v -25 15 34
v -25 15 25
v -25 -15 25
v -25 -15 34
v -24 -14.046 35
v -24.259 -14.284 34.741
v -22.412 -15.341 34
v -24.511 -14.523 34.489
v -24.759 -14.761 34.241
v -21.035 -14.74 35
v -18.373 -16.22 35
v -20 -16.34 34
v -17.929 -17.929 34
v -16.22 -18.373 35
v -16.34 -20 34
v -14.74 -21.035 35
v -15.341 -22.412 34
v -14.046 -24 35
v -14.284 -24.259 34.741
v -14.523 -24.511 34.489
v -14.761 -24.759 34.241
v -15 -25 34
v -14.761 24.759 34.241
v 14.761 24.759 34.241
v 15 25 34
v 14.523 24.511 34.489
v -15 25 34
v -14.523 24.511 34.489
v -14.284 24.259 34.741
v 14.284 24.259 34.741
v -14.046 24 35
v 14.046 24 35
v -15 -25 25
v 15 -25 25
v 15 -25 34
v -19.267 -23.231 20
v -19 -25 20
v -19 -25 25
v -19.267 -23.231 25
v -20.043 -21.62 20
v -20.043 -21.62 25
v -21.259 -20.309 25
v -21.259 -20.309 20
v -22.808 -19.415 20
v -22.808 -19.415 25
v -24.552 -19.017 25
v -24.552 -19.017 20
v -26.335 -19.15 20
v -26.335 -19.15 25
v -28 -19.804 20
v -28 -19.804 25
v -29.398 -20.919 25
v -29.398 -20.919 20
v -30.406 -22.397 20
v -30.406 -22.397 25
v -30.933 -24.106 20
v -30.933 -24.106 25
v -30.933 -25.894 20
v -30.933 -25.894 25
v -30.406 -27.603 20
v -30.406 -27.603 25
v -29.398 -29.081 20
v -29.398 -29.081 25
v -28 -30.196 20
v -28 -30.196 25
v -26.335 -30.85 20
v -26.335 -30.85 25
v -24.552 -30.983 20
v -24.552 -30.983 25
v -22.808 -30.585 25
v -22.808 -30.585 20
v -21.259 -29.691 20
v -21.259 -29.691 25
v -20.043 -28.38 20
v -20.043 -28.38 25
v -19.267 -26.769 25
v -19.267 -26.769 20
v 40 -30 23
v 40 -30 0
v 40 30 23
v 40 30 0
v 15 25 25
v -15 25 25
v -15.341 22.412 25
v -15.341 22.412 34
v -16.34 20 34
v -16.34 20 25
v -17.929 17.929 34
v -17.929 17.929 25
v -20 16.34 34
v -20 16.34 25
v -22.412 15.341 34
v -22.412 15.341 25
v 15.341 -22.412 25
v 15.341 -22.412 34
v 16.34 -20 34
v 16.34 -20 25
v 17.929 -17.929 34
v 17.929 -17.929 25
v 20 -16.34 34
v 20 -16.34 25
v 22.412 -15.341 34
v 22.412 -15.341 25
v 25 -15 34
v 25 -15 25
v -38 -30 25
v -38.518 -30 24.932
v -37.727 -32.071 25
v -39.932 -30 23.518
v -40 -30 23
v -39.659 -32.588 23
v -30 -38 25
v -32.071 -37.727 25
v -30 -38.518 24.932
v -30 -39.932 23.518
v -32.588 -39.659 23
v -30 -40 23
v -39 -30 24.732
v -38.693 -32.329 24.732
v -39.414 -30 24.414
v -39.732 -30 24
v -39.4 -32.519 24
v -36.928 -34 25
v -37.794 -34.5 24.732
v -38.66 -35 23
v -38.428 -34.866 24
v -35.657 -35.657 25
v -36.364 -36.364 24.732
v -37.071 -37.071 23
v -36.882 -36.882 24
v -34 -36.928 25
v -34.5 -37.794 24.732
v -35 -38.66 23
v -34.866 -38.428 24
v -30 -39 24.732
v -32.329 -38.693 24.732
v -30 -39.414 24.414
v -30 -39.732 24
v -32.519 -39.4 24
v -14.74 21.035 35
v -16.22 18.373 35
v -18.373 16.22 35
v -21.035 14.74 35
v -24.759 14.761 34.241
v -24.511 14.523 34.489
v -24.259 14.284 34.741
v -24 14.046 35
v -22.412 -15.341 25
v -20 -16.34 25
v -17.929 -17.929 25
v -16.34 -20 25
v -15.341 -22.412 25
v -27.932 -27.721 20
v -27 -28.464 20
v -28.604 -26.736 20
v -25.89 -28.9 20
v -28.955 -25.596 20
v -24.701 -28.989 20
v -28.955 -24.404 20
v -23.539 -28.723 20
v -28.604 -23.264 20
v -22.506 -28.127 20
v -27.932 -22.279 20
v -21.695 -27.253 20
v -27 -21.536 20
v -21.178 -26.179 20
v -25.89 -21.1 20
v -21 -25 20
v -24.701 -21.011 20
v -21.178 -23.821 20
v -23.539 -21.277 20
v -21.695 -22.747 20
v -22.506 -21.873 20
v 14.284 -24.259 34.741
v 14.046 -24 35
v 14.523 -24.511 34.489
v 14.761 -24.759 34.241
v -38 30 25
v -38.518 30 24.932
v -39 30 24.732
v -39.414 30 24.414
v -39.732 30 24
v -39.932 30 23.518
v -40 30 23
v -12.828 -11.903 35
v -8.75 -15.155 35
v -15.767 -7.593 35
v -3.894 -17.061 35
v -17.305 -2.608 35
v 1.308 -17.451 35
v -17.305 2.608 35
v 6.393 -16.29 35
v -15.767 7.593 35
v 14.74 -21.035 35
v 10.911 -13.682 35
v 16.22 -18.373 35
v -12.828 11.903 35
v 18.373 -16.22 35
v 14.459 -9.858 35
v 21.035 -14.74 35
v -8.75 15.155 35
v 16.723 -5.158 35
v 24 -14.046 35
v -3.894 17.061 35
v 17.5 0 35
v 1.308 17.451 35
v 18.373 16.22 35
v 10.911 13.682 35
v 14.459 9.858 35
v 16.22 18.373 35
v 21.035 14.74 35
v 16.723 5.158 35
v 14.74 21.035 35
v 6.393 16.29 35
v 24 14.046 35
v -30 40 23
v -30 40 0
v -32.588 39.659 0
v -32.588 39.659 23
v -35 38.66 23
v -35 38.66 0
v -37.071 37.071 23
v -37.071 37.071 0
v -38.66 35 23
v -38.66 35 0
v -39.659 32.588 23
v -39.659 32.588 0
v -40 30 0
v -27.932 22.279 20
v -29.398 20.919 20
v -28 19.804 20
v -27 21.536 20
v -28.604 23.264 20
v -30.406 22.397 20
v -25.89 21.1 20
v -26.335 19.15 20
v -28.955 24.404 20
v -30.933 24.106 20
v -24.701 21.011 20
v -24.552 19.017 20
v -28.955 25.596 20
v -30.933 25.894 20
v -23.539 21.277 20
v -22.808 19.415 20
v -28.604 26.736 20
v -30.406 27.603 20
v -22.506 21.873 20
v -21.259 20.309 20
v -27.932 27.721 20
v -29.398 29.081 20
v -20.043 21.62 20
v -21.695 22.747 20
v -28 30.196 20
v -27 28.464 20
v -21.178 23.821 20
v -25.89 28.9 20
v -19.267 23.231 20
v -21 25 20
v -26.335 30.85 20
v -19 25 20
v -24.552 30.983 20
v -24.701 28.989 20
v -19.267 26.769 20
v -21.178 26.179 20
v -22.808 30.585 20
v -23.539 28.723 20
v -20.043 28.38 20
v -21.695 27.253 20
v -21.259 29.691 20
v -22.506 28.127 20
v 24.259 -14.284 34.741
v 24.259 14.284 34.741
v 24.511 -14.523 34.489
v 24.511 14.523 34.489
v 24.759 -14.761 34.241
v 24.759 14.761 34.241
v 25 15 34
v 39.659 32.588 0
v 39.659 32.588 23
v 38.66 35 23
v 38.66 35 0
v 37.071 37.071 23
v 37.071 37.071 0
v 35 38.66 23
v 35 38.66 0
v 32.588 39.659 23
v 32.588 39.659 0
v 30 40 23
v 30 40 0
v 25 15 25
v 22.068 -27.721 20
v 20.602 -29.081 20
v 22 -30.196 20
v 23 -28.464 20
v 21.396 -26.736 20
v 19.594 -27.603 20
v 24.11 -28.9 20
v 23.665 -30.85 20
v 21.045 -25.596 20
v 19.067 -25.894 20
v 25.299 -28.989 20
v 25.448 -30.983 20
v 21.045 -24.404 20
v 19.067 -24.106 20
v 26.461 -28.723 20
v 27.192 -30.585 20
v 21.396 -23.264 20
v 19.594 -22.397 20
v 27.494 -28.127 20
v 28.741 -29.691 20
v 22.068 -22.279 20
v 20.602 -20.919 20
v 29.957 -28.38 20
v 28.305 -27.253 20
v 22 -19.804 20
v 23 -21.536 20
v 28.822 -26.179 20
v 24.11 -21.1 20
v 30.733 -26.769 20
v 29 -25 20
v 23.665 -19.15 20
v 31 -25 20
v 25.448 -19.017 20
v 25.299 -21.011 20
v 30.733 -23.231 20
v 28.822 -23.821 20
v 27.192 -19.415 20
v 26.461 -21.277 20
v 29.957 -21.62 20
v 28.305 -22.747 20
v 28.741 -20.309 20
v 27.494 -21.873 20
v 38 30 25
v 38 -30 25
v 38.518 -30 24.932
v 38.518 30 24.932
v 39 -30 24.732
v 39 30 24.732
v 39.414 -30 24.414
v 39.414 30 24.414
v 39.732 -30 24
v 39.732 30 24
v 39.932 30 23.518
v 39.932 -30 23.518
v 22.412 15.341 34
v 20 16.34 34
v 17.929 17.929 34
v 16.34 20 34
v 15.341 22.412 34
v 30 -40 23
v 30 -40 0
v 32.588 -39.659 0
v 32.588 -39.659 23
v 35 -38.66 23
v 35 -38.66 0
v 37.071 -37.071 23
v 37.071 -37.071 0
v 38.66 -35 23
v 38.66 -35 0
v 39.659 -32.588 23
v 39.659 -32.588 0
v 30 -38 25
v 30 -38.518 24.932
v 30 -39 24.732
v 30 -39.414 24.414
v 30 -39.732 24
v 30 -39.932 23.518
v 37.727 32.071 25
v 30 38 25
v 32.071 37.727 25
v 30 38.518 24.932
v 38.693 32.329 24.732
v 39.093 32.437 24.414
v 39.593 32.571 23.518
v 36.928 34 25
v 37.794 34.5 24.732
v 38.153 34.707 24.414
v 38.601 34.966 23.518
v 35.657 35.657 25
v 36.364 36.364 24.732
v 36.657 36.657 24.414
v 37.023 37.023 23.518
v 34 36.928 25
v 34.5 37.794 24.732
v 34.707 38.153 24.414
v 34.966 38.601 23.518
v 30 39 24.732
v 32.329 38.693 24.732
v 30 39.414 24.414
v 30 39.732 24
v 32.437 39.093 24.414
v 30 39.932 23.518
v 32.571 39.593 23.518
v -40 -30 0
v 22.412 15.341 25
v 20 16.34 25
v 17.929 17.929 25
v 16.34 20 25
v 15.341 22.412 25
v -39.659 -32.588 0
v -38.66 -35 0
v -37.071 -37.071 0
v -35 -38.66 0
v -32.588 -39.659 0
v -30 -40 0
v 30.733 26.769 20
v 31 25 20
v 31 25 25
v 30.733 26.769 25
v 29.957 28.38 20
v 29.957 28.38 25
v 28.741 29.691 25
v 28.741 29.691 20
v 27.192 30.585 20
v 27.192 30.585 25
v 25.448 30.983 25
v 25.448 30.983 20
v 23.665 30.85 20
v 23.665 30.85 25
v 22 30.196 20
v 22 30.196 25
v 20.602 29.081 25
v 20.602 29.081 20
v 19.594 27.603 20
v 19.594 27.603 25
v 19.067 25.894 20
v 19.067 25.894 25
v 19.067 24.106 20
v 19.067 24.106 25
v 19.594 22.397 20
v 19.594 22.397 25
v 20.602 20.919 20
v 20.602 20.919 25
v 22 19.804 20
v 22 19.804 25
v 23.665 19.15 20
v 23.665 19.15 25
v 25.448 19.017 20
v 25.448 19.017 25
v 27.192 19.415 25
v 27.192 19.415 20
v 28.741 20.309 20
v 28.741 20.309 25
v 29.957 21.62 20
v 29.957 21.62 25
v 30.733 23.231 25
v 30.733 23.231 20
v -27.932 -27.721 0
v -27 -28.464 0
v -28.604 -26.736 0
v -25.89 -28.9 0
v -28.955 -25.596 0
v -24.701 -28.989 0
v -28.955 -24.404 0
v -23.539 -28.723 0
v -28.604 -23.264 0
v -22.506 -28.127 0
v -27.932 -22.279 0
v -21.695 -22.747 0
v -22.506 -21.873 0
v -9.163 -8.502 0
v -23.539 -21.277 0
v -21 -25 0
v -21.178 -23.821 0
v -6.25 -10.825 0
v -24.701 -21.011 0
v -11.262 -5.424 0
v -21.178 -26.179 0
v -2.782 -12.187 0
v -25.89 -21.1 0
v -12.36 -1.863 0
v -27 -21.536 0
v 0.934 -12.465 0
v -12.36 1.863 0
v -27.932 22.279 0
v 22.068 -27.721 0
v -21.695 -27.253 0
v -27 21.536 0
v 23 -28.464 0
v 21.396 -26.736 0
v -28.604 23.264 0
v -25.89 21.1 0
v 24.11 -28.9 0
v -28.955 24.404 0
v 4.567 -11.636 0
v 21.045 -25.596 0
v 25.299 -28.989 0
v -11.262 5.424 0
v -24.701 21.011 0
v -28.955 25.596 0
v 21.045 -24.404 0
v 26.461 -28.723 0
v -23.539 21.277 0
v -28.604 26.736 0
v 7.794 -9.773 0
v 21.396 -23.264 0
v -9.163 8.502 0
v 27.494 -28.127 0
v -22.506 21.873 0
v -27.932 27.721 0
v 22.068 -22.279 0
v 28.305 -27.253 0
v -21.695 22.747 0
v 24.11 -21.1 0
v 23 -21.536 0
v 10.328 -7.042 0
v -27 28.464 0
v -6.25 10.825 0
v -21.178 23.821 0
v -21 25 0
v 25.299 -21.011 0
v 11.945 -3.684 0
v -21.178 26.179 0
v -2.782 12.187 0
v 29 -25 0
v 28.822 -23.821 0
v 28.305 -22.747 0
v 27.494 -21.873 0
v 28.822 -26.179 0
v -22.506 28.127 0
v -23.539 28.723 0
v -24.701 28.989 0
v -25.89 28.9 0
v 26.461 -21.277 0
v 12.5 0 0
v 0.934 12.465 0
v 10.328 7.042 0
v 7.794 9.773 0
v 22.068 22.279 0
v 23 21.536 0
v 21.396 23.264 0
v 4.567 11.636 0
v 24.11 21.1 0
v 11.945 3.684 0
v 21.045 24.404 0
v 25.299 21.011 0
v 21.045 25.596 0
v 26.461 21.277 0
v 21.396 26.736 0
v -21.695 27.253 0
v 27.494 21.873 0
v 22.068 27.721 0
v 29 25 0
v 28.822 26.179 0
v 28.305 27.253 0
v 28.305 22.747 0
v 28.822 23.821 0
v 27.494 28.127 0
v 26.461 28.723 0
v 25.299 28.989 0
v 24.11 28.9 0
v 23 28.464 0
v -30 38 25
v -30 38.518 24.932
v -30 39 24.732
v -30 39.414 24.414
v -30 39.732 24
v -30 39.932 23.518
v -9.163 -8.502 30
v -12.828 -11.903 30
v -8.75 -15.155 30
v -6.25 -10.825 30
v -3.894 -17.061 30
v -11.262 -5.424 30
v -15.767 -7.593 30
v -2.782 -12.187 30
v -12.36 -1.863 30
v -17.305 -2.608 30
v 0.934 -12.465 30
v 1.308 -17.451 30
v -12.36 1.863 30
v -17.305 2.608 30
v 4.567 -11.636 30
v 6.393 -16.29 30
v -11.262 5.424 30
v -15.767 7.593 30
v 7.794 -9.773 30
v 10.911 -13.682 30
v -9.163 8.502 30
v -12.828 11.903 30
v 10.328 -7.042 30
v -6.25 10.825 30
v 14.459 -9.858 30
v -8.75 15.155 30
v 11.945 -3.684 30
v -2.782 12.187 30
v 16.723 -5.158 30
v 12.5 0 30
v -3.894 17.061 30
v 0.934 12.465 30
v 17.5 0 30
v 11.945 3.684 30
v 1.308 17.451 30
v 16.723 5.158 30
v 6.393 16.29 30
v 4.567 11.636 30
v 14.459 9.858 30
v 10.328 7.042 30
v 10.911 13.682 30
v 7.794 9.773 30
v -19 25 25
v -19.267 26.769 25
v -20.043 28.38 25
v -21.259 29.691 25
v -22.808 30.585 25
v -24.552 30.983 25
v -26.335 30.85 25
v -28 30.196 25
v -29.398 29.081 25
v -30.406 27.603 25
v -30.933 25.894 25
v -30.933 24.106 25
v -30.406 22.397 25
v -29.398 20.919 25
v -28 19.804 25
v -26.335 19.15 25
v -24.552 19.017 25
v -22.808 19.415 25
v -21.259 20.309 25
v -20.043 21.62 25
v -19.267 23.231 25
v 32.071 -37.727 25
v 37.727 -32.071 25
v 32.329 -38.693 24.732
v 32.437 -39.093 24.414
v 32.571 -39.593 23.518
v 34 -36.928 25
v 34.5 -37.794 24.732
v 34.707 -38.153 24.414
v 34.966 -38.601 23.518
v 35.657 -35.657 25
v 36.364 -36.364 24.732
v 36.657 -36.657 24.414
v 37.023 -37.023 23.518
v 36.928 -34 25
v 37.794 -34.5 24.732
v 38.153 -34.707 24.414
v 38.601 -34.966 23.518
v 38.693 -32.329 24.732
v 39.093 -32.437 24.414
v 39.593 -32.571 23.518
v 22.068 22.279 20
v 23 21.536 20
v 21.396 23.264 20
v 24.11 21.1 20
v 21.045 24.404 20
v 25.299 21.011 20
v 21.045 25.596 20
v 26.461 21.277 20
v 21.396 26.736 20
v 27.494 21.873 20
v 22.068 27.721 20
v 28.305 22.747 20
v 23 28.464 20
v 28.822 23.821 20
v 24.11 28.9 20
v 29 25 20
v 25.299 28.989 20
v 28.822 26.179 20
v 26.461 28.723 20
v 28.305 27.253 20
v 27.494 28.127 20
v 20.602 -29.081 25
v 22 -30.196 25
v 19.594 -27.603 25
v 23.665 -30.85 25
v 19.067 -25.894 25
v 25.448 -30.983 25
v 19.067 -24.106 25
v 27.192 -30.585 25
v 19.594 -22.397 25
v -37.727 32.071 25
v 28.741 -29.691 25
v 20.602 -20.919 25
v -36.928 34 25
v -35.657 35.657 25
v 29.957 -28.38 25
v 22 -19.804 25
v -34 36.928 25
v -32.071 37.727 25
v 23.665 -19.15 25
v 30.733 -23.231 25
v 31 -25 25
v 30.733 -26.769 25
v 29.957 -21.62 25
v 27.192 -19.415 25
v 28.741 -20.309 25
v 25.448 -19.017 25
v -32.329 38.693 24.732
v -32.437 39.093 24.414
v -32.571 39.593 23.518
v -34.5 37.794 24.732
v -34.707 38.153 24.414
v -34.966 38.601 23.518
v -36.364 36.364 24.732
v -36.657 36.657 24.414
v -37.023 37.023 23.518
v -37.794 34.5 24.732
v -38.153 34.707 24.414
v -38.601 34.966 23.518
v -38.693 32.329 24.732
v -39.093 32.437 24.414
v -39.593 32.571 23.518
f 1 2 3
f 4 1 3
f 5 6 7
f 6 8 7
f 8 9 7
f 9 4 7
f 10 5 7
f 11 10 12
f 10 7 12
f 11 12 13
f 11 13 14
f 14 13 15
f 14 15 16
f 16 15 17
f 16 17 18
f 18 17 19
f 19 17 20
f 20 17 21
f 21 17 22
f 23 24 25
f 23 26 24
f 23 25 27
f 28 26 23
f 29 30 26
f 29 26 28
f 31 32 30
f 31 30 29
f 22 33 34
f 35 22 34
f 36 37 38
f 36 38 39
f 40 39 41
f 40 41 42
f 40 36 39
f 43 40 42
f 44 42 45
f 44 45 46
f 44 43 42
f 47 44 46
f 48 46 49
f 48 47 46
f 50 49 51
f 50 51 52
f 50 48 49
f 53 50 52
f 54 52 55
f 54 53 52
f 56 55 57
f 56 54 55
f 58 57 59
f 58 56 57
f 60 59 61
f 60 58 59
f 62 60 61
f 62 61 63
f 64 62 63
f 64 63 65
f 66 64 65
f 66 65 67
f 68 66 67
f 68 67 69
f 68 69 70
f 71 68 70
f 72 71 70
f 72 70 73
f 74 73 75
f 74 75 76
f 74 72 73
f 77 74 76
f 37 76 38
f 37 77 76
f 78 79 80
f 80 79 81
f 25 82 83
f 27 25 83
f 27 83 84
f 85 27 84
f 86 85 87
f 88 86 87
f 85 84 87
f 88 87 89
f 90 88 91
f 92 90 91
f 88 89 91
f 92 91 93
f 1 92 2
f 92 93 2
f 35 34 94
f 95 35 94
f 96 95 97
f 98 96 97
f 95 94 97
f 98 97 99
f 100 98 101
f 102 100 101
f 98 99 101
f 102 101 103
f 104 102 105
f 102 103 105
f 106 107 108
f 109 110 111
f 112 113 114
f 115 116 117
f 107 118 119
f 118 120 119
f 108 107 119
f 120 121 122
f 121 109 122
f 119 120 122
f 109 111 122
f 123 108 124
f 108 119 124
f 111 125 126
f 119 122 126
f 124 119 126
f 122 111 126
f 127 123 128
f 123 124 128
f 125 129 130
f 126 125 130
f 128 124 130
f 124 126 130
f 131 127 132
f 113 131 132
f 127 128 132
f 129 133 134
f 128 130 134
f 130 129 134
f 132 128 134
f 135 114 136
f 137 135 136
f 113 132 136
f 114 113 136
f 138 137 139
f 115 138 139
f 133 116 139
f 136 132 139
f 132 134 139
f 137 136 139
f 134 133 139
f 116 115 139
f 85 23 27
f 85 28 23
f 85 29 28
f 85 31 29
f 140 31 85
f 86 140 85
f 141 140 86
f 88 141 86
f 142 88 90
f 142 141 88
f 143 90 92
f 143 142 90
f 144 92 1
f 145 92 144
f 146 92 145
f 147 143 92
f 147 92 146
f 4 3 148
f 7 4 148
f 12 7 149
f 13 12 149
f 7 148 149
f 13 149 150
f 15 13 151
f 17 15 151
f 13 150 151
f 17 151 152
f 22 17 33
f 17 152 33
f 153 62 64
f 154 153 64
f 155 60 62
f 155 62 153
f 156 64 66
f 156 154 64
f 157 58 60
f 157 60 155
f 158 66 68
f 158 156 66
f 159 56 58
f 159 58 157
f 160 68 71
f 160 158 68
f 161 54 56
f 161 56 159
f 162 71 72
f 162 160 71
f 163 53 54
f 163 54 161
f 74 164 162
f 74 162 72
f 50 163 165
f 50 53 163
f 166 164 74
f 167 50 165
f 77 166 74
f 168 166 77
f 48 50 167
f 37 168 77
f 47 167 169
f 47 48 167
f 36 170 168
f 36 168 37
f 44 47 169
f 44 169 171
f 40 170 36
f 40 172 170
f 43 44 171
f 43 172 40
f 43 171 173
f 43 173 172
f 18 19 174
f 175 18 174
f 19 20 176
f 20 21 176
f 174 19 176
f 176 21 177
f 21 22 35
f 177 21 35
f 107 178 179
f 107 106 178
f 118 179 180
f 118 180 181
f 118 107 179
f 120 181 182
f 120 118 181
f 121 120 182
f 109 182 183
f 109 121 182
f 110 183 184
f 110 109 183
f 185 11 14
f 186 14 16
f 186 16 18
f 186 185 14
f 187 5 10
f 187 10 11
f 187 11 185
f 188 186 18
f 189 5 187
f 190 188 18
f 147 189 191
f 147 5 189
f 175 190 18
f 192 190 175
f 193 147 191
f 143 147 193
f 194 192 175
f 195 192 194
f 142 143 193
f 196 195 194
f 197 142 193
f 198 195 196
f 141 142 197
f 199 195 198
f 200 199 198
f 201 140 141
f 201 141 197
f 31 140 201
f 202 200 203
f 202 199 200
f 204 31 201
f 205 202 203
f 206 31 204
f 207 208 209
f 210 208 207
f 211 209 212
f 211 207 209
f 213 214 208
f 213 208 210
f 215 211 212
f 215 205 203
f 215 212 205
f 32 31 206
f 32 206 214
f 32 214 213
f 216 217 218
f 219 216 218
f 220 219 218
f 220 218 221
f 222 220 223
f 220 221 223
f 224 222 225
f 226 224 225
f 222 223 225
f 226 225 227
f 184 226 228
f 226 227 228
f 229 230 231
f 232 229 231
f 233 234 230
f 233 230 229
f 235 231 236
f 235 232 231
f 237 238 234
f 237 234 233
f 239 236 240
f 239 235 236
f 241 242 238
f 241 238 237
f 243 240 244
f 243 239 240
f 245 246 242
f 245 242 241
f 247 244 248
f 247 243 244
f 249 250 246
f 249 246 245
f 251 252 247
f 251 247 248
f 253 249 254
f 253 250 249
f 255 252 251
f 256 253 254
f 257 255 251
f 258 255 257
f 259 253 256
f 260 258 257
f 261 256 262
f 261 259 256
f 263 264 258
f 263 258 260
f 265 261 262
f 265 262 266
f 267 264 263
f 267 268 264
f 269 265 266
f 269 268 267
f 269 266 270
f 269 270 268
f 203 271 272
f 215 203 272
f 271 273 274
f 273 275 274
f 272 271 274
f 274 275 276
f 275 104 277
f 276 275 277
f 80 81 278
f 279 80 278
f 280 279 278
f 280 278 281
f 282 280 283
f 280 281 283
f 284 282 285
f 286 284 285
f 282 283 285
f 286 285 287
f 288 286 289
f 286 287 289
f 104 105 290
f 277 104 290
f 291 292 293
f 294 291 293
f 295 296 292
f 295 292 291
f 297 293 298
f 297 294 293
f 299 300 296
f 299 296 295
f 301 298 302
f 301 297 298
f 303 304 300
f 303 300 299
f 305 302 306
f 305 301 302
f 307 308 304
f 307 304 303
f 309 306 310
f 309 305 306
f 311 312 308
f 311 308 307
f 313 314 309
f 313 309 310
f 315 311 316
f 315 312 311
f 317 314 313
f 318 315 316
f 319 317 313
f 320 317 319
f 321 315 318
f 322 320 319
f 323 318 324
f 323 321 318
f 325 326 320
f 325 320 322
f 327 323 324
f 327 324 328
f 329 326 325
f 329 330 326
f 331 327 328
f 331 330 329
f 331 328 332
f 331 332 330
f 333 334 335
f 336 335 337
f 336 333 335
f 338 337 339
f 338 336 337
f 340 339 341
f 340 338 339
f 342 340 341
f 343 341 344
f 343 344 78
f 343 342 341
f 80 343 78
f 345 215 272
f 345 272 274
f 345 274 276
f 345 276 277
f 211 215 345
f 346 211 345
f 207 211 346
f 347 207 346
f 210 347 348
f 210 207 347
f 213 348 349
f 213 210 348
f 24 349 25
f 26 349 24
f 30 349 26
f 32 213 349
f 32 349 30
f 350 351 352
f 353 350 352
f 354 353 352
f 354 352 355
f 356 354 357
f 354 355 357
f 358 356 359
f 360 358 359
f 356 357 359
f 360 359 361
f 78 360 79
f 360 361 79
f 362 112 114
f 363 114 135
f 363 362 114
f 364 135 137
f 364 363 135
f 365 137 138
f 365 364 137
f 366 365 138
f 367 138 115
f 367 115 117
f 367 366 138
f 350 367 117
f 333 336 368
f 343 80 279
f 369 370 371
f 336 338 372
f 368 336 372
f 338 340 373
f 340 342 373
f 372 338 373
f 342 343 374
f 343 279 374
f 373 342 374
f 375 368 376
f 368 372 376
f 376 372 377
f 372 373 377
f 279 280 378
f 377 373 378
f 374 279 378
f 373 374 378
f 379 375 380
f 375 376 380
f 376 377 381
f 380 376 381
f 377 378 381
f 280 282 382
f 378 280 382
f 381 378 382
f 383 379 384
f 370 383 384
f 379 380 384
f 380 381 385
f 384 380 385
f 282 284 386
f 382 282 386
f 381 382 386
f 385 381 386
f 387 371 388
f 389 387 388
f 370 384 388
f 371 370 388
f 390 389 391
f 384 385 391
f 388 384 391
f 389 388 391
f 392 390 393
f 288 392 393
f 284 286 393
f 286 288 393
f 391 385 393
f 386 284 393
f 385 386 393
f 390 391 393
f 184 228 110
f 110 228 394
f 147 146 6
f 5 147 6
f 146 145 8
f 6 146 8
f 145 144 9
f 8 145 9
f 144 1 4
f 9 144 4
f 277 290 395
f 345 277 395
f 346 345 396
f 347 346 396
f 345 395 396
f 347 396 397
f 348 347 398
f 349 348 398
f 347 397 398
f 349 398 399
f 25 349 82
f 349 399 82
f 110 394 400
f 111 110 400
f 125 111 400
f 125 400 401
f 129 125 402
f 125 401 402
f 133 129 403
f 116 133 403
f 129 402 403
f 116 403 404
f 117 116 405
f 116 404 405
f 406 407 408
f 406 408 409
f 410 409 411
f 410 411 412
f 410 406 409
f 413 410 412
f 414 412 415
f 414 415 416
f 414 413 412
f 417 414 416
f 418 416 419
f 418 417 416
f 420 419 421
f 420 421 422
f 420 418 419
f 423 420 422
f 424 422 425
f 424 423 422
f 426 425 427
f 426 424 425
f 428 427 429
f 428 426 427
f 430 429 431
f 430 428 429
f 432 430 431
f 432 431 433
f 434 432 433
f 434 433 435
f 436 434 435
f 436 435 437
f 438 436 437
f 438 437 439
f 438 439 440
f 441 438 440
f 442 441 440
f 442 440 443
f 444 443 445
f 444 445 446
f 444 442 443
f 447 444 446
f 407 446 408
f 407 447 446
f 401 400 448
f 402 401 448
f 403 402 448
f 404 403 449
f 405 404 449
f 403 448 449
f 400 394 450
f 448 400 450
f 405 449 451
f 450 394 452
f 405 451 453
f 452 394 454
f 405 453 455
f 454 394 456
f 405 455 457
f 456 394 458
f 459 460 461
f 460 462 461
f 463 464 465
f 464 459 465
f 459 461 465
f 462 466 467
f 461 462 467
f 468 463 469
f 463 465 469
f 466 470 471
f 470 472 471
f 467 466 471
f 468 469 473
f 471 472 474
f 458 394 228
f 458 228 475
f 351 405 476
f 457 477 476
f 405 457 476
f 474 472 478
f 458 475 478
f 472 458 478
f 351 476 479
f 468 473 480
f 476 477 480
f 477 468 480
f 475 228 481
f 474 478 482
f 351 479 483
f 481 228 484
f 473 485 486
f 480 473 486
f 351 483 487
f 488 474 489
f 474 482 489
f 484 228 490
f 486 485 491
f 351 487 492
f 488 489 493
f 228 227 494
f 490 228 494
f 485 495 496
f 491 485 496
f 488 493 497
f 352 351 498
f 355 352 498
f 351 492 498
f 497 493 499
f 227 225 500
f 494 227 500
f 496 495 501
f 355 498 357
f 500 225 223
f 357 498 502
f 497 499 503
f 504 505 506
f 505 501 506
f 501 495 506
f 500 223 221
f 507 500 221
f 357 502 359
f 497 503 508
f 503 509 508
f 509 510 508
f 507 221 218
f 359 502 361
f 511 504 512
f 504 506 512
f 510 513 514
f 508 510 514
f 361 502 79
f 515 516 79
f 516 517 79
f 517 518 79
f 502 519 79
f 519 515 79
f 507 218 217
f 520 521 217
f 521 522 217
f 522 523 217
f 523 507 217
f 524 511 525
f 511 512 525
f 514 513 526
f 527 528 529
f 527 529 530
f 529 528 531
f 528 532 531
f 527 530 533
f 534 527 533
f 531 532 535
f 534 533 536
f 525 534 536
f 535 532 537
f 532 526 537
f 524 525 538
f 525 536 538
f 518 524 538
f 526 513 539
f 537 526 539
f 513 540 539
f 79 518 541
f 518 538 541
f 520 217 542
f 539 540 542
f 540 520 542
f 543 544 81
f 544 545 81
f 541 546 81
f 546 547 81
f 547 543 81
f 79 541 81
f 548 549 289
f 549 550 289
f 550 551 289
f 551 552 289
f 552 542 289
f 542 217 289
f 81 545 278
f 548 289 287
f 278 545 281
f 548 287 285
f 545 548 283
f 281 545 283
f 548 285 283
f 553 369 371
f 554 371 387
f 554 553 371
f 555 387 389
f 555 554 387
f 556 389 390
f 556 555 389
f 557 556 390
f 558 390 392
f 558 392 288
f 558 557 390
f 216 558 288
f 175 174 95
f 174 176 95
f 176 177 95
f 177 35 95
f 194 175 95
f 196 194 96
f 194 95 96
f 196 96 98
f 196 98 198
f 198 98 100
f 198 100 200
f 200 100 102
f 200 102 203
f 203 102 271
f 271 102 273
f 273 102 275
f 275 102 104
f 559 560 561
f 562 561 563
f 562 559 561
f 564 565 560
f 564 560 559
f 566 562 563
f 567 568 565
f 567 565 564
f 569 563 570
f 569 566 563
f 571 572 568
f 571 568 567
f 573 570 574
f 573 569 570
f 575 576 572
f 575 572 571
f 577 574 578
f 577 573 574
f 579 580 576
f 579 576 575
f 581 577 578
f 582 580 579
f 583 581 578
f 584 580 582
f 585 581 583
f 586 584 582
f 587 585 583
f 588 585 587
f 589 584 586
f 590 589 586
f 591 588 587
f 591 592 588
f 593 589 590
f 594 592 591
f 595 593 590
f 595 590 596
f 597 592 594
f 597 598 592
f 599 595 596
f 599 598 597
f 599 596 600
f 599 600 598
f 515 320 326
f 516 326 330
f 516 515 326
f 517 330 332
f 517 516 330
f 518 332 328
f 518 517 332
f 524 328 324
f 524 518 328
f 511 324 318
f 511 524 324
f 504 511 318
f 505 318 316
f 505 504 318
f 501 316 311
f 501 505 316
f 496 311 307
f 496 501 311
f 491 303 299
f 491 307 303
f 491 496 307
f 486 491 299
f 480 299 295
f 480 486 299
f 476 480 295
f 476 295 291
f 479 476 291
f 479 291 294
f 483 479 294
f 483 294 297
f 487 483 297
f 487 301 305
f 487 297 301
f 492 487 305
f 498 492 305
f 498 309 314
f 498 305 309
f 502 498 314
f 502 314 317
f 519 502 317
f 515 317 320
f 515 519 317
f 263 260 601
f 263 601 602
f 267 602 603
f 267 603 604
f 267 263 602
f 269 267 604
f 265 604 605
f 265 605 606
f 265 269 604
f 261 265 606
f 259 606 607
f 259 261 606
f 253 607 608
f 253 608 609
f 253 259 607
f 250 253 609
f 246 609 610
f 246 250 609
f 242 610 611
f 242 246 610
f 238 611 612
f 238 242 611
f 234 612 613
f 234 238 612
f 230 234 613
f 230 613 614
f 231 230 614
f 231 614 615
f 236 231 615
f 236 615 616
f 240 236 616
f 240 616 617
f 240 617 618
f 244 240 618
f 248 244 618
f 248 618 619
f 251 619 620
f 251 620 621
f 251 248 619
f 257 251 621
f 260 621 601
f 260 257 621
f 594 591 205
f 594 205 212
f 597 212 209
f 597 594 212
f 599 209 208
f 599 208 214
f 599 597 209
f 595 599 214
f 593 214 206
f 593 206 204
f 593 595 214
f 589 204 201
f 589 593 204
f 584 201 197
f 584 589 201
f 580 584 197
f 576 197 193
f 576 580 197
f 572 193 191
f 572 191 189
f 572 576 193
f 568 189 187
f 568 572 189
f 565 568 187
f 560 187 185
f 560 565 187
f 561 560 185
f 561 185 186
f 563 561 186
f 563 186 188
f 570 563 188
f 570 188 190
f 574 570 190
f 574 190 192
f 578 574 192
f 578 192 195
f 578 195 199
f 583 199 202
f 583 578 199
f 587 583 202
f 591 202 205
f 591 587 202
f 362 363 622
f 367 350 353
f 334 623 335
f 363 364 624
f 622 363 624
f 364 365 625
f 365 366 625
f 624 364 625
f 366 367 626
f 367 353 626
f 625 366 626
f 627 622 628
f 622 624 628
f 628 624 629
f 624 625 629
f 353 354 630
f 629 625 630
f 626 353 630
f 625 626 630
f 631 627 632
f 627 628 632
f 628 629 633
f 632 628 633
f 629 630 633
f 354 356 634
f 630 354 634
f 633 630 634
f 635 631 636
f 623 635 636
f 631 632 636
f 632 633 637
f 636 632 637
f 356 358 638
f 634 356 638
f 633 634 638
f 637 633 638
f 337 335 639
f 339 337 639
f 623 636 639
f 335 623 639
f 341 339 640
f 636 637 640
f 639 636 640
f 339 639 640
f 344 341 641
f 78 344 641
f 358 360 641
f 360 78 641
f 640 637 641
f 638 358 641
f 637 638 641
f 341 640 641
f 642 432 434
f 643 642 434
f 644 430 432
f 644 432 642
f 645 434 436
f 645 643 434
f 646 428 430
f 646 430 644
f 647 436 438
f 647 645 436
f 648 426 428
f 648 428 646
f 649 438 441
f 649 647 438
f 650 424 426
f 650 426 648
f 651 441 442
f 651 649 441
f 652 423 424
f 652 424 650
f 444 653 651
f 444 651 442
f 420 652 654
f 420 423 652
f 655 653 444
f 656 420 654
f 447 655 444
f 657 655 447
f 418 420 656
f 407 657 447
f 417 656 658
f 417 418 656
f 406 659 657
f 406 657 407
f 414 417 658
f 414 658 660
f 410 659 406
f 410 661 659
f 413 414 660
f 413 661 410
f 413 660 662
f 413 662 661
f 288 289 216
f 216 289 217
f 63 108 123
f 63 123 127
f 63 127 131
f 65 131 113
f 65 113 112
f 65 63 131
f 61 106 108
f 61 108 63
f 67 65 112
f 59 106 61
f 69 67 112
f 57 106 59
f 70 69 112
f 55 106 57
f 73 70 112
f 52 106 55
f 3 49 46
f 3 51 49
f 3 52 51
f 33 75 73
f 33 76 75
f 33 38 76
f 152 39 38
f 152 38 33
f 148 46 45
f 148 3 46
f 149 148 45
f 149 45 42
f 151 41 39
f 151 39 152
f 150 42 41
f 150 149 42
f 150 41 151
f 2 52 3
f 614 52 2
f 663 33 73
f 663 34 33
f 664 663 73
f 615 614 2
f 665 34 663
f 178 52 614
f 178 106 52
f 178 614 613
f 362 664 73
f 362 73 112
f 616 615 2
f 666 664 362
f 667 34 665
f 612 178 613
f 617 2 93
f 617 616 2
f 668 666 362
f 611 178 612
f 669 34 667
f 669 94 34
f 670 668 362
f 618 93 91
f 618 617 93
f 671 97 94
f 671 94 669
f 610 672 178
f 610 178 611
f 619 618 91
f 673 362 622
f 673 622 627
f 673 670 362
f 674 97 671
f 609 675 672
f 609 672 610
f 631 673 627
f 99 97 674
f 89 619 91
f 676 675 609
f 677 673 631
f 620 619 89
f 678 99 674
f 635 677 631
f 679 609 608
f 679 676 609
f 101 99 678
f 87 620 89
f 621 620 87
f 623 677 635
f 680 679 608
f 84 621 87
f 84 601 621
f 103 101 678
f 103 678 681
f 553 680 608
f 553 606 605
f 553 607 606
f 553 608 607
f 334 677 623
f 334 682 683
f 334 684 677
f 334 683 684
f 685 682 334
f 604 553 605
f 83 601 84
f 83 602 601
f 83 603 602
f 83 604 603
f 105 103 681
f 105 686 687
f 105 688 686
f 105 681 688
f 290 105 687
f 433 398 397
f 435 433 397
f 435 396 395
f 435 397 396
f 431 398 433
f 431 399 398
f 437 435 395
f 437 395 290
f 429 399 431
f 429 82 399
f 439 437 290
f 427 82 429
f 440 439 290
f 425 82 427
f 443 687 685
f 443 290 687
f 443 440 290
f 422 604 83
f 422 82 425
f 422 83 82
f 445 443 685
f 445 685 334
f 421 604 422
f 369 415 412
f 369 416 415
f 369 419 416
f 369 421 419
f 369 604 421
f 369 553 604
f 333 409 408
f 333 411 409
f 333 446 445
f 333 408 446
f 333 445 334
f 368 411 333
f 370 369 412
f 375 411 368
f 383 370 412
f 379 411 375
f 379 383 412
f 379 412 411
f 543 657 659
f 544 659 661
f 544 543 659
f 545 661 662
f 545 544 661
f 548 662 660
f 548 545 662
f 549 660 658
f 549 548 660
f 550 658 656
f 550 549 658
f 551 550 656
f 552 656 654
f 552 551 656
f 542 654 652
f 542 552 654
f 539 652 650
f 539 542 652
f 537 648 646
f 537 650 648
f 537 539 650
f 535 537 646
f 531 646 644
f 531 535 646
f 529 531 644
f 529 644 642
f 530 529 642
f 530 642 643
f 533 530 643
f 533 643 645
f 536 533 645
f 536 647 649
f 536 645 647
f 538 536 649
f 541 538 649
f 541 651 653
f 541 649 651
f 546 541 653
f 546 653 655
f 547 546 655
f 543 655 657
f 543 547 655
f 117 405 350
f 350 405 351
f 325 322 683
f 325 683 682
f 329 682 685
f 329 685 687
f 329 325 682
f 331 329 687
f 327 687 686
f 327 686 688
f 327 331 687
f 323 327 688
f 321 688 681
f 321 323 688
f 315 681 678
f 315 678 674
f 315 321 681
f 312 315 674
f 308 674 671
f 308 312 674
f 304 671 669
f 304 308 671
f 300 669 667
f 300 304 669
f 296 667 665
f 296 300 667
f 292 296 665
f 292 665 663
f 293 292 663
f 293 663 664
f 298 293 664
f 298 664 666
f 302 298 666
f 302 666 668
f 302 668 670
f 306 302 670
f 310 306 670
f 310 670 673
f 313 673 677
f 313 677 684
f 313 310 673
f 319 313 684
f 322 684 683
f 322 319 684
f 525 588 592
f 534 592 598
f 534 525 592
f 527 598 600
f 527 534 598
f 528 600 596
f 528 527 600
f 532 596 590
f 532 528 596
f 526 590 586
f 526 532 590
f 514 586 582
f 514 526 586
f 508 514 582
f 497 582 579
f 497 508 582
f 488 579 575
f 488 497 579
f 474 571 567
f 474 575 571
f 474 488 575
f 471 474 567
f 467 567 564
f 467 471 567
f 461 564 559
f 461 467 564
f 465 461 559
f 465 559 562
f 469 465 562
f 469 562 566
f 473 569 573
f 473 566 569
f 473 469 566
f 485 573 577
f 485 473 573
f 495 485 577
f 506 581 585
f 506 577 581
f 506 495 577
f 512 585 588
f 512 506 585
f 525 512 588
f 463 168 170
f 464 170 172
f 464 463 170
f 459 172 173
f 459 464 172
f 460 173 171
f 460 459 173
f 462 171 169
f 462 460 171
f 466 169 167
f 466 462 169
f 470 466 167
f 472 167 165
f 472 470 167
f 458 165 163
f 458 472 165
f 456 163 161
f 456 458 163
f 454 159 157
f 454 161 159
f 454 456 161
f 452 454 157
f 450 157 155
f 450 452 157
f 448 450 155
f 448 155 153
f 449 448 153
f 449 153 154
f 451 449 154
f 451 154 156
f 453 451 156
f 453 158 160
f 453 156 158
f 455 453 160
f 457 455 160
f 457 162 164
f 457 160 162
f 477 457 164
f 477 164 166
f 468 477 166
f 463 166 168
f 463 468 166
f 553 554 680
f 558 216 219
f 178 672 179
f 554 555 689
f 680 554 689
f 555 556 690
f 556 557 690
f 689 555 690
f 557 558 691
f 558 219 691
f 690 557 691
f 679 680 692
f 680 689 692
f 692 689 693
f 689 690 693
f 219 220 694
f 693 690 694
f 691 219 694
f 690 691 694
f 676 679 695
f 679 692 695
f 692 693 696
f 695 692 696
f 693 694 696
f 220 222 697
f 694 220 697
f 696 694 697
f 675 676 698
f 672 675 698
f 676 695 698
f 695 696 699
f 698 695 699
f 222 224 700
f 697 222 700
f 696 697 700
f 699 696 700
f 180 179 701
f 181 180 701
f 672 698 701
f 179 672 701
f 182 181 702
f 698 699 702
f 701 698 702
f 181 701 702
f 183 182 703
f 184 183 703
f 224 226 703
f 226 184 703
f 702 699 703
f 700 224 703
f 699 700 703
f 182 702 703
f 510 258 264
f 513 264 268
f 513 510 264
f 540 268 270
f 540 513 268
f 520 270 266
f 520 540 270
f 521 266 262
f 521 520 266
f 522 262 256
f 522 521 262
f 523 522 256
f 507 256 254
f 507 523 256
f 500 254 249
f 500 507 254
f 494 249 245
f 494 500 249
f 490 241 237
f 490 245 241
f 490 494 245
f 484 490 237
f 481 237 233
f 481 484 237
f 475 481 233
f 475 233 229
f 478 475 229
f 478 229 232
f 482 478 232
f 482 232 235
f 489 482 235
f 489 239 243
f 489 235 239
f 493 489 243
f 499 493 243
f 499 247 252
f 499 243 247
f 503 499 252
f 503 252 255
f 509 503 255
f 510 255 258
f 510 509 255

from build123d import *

# Parameters (mm, degrees)
F3_R      = 4
F3_R_2    = 12.5
F7_DEPTH  = 25
F4_R      = 12.5
F8_DEPTH  = 10
F5_R      = 17.5
F9_DEPTH  = 5
F6_R      = 6
F10_DEPTH = 5
F11_SIZE  = 1
F12_R     = 2


with BuildPart() as f7:
    # F3 (on Top) → F7 (new body)
    with BuildSketch(Plane.XY):
        with BuildLine():
            Line((30, 40), (-30, 40))
            ThreePointArc((-30, 40), (-37.071068, 37.071068), (-40, 30))
            Line((-40, 30), (-40, -30))
            ThreePointArc((-40, -30), (-37.071068, -37.071068), (-30, -40))
            Line((-30, -40), (30, -40))
            ThreePointArc((30, -40), (37.071068, -37.071068), (40, -30))
            Line((40, -30), (40, 30))
            ThreePointArc((40, 30), (37.071068, 37.071068), (30, 40))
        make_face()
        with Locations((-25, -25)):
            Circle(F3_R, mode=Mode.SUBTRACT)
        with Locations((25, -25)):
            Circle(F3_R, mode=Mode.SUBTRACT)
        with Locations((-25, 25)):
            Circle(F3_R, mode=Mode.SUBTRACT)
        Circle(F3_R_2, mode=Mode.SUBTRACT)
        with Locations((25, 25)):
            Circle(F3_R, mode=Mode.SUBTRACT)
    extrude(amount=F7_DEPTH)

    # F4 (on offset) → F8 (join)
    with BuildSketch(Plane.XY.offset(25)):
        with BuildLine():
            Line((15, 25), (-15, 25))
            ThreePointArc((-15, 25), (-17.928932, 17.928932), (-25, 15))
            Line((-25, 15), (-25, -15))
            ThreePointArc((-25, -15), (-17.928932, -17.928932), (-15, -25))
            Line((-15, -25), (15, -25))
            ThreePointArc((15, -25), (17.928932, -17.928932), (25, -15))
            Line((25, -15), (25, 15))
            ThreePointArc((25, 15), (17.928932, 17.928932), (15, 25))
        make_face()
        Circle(F4_R, mode=Mode.SUBTRACT)
    extrude(amount=F8_DEPTH)

    # F5 (on offset) → F9 (cut)
    with BuildSketch(Plane.XY.offset(30)):
        Circle(F5_R)
    extrude(amount=F9_DEPTH, mode=Mode.SUBTRACT)

    # F6 (on offset) → F10 (cut)
    with BuildSketch(Plane.XY.offset(20)):
        with Locations((-25, 25)):
            Circle(F6_R)
        with Locations((25, 25)):
            Circle(F6_R)
        with Locations((25, -25)):
            Circle(F6_R)
        with Locations((-25, -25)):
            Circle(F6_R)
    extrude(amount=F10_DEPTH, mode=Mode.SUBTRACT)

    # F11
    f11_edges = [f7.edges().sort_by_distance(p)[0] for p in [
        (-17.928932, 17.928932, 35),
        (-25, 0, 35),
        (-17.928932, -17.928932, 35),
        (0, -25, 35),
        (17.928932, -17.928932, 35),
        (25, 0, 35),
        (17.928932, 17.928932, 35),
        (0, 25, 35),
    ]]
    chamfer(f11_edges, length=F11_SIZE)

    # F12
    f12_edges = [f7.edges().sort_by_distance(p)[0] for p in [
        (-37.071068, -37.071068, 25),
        (-40, 0, 25),
    ]]
    fillet(f12_edges, radius=F12_R)


solid = f7.part
